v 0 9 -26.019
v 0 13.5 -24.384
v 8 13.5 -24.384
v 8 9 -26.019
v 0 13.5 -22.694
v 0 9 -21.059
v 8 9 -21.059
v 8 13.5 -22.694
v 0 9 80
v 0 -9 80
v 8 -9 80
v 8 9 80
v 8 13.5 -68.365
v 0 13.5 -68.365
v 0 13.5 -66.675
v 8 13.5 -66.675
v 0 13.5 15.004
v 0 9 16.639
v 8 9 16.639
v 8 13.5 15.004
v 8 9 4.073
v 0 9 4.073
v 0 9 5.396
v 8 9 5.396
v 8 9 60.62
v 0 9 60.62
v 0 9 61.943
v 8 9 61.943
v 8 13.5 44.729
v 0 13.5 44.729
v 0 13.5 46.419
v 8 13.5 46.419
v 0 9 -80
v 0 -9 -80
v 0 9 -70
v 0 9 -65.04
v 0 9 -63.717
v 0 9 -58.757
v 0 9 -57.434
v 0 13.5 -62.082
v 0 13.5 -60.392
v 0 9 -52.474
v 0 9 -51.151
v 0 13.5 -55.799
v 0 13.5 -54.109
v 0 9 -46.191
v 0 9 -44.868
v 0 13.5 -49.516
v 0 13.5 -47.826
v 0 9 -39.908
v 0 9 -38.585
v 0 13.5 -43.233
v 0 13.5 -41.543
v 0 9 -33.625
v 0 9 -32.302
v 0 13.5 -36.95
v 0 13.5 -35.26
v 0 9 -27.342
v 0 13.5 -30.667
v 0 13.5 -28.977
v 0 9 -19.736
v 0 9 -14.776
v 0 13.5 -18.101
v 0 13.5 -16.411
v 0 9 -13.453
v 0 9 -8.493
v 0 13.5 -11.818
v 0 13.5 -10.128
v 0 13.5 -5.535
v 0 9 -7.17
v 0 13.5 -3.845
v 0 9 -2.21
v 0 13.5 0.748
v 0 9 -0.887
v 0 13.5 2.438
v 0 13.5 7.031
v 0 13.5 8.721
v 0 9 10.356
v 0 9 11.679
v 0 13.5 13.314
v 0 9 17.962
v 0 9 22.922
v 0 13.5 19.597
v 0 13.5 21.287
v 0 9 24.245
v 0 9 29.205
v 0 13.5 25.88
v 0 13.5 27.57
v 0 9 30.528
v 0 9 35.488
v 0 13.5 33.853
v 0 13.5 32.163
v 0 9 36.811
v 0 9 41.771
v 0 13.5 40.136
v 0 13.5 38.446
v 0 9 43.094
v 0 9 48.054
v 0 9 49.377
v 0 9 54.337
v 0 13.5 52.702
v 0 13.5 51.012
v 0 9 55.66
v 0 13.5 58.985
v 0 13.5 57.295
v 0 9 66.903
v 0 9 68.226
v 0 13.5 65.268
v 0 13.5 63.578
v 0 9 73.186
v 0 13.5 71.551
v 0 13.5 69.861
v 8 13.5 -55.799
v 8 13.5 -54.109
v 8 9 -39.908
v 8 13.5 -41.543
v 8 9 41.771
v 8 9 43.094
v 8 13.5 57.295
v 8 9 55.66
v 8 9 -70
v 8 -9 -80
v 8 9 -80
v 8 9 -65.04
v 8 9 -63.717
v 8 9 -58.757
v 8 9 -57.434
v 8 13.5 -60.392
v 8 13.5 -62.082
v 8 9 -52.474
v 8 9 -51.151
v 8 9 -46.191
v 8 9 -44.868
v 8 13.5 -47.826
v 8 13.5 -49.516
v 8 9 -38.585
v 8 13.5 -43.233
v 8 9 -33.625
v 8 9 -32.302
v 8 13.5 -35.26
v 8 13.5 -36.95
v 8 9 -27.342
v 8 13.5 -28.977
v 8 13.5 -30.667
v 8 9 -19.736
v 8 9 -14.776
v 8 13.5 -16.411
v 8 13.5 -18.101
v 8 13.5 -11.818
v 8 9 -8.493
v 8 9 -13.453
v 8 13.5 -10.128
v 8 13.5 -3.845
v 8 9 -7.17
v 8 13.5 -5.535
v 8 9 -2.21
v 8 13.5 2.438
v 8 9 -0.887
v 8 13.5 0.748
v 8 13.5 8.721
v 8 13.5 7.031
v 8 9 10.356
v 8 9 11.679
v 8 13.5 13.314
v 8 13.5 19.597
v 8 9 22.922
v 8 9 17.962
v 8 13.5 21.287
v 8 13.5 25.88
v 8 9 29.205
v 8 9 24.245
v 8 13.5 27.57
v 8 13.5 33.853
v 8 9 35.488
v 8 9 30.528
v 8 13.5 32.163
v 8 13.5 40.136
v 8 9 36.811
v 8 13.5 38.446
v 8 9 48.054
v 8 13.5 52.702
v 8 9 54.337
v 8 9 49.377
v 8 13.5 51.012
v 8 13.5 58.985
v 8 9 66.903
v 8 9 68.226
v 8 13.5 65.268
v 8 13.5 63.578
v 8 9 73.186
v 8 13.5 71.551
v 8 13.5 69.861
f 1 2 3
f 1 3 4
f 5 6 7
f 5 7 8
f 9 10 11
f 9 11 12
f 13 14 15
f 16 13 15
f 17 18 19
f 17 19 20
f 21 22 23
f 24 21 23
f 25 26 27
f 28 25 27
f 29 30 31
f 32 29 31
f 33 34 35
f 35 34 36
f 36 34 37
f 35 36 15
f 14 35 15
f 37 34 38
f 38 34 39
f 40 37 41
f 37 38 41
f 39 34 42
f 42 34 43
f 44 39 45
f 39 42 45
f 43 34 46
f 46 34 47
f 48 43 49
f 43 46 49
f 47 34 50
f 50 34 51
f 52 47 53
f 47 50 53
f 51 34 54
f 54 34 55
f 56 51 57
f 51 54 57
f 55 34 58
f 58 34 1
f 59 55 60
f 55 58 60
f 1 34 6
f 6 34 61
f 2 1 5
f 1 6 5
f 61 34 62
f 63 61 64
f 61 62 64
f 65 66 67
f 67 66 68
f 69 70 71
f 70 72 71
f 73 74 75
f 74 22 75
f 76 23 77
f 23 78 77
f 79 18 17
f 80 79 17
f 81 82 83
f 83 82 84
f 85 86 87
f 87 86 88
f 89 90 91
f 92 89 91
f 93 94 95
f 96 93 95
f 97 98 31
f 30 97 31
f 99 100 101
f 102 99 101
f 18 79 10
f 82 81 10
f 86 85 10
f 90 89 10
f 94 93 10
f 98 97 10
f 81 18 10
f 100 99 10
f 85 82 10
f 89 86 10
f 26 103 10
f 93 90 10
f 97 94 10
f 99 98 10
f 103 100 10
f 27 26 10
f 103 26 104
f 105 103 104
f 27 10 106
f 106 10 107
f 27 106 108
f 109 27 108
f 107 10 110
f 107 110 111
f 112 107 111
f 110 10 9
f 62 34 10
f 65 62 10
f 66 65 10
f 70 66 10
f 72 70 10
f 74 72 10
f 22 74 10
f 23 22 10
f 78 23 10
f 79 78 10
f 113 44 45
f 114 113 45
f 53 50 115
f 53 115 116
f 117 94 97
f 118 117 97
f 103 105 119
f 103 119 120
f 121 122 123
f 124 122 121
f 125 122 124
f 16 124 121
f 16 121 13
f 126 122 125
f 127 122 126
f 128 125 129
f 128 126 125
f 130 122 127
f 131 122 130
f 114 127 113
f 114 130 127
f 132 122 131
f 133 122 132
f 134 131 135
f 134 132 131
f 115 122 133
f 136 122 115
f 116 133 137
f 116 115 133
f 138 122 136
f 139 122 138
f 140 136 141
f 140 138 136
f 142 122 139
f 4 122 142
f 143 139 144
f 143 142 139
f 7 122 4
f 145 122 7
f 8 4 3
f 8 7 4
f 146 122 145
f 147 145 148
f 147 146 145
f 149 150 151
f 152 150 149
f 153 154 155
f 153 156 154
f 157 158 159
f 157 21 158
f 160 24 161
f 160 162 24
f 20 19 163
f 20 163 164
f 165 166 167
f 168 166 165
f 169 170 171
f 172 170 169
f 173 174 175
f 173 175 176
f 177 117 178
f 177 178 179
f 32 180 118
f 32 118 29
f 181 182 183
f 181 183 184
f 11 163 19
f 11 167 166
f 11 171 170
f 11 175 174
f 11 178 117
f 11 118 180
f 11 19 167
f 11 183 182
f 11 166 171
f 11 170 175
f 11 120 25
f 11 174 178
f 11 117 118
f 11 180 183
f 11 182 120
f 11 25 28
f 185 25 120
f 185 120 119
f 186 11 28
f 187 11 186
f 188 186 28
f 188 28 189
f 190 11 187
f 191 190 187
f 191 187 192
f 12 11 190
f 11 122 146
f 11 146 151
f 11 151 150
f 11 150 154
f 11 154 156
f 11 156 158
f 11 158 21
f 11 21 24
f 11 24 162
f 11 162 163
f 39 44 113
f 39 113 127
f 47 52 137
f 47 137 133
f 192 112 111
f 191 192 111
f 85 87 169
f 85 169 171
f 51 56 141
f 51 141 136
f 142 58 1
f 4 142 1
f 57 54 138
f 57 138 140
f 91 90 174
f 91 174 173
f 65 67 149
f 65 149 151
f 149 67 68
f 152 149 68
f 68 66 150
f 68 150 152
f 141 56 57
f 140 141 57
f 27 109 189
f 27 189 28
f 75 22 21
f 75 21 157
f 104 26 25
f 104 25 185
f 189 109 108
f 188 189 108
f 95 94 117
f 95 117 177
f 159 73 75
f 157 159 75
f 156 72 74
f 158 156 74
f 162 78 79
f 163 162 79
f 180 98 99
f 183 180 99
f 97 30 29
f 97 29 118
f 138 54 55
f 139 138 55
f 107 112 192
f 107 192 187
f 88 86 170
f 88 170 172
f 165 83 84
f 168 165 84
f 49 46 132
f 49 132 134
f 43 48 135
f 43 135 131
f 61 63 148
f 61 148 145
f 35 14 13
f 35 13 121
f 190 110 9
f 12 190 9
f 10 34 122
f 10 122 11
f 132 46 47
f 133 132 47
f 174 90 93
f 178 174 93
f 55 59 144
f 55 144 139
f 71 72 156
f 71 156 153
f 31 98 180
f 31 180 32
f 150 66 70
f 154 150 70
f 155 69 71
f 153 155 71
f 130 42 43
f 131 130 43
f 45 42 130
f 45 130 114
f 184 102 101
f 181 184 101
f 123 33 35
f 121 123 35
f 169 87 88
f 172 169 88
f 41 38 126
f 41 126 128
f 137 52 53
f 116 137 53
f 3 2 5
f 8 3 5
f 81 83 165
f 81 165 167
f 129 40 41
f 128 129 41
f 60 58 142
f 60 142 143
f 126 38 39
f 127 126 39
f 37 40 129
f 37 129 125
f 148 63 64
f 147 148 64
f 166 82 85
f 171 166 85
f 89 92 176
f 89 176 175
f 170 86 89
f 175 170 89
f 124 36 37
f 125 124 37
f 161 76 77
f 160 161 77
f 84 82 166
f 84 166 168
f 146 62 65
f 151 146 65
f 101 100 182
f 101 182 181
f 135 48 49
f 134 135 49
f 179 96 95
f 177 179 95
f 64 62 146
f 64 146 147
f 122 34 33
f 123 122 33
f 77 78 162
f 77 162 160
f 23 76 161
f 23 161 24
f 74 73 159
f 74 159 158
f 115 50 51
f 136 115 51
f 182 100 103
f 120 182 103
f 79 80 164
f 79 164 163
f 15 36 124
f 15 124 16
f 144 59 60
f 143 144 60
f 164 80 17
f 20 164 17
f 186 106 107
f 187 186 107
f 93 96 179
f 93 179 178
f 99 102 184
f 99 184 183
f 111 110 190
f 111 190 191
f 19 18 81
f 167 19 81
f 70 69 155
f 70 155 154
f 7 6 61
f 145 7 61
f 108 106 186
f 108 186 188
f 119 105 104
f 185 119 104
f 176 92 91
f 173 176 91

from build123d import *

# Parameters (mm, degrees)
SKETCH1_W           = 18
SKETCH1_H           = 160
BOSS_EXTRUDE1_DEPTH = 8
BOSS_EXTRUDE2_DEPTH = 8
LPATTERN1_COUNT     = 23
LPATTERN1_PITCH     = 6.283


with BuildPart() as part:
    # Sketch1 → Boss-Extrude1 (new body)
    with BuildSketch(Plane.YZ):
        Rectangle(SKETCH1_W, SKETCH1_H)
    extrude(amount=BOSS_EXTRUDE1_DEPTH)

    # Sketch2 → Boss-Extrude2 (add)
    with BuildSketch(Plane.YZ):
        Polygon((9, -70), (9, -65.04), (13.5, -66.675), (13.5, -67.52), (13.5, -68.365), align=None)
    boss_extrude2 = extrude(amount=BOSS_EXTRUDE2_DEPTH)

    # LPattern1: Boss-Extrude2 ×23
    with Locations(*[(0, 0, i * LPATTERN1_PITCH) for i in range(1, LPATTERN1_COUNT)]):
        add(boss_extrude2)


solid = part.part
